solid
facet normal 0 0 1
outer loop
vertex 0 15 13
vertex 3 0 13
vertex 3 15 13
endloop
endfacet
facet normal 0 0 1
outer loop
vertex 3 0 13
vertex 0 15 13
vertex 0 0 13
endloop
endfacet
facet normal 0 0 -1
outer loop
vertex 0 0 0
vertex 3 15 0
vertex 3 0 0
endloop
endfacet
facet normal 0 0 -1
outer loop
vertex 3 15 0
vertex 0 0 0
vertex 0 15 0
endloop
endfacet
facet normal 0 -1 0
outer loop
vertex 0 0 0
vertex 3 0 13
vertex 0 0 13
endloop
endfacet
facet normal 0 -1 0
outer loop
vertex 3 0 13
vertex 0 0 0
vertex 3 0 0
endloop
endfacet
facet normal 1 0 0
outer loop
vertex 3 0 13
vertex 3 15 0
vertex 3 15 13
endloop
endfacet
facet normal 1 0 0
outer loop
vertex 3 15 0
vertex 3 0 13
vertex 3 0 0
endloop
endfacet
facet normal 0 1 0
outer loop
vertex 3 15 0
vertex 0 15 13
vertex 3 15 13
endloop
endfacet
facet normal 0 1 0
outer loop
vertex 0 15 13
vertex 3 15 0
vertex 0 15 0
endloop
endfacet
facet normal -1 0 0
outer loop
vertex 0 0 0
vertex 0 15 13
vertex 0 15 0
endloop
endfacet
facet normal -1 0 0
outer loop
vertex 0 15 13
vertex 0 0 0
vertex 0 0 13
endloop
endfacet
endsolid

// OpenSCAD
// Generated by SolidPython 1.0.1 on 2020-07-29 00:46:54


cube(size = [3, 15, 13]);
/***********************************************
*********      SolidPython code:      **********
************************************************
 
# import packages: SolidPython
from solid import *
from solid.utils import *
from itertools import chain, combinations, permutations


class Resize:

    def __init__(self, scad_file):
        self.scad_file = scad_file
        #self.scad_file = import_scad(scad_file)
        # cone/cylinder param:
        self.r1 = 0
        self.r2 = 0
        self.h = 0
        # rectangular prism param:
        self.w = 0
        self.l = 0
        # ellipse param:
        self.r = 0

    # import OpenScad code (file name corresponds to shape)


    # classify shape + parameters
    def assign(self, param1, param2, param3):
        if self.scad_file == 'cone.scad':
            self.r1 = param1
            self.r2 = param2
            self.h = param3
        elif self.scad_file == 'cylinder.scad':
            self.r1 = param1
            self.r2 = param2
            self.h = param3
        elif self.scad_file == 'rectangularPrism.scad':
            self.h = param1
            self.l = param2
            self.w = param3
        else:
            self.r = param1
            self.h = param2

    # resize parameters
    def iterate(self):
        x = range(3, 20, 2)
        i = 1
        if self.scad_file == 'cone.scad':
            tempList = list(permutations(x, 2))
            for temp in tempList:
                param1 = temp[0]
                param2 = temp[1]
                filepath = 'produced_scad_files/' + 'cone' + str(param1) + '_' + str(param2) + '_' + '.scad'
                scad_render_to_file(cylinder(h=param1, r1=param2, r2=0), filepath)

        elif self.scad_file == 'cylinder.scad':
            tempList = list(permutations(x, 3))
            for temp in tempList:
                param1 = temp[0]
                param2 = temp[1]
                filepath = 'produced_scad_files/' + 'cylinder' + str(param1) + '_' + str(param2) + '_' + '.scad'
                scad_render_to_file(cylinder(h=param1, r1=param2, r2=param2), filepath)

        elif self.scad_file == 'rectangularPrism.scad':
            tempList = list(permutations(x, 3))
            for temp in tempList:
                param1 = temp[0]
                param2 = temp[1]
                param3 = temp[2]
                filepath = 'produced_scad_files/' + 'rectangularPrism' + str(param1) + '_' + str(param2) + '_' + str(
                    param3) + '.scad'
                scad_render_to_file(cube(size=(param1, param2, param3)), filepath)

        elif self.scad_file == 'ellipse.scad':
            tempList = list(permutations(x, 4))
            for temp in tempList:
                param1 = temp[0]
                param2 = temp[1]
                param3 = temp[2]
                param4 = temp[3]
                filepath = 'produced_scad_files/' + 'ellipse' + str(param1) + '_' + str(param2) + '_' + str(param3) + '_' + str(param4) + '.scad'
                scad_render_to_file(scale([param1, param2, param3])(sphere(r=param4)), filepath)

    def render_to_scadfile(self):
        scad_render_to_file(scad, 'example.scad') 
 
************************************************/
